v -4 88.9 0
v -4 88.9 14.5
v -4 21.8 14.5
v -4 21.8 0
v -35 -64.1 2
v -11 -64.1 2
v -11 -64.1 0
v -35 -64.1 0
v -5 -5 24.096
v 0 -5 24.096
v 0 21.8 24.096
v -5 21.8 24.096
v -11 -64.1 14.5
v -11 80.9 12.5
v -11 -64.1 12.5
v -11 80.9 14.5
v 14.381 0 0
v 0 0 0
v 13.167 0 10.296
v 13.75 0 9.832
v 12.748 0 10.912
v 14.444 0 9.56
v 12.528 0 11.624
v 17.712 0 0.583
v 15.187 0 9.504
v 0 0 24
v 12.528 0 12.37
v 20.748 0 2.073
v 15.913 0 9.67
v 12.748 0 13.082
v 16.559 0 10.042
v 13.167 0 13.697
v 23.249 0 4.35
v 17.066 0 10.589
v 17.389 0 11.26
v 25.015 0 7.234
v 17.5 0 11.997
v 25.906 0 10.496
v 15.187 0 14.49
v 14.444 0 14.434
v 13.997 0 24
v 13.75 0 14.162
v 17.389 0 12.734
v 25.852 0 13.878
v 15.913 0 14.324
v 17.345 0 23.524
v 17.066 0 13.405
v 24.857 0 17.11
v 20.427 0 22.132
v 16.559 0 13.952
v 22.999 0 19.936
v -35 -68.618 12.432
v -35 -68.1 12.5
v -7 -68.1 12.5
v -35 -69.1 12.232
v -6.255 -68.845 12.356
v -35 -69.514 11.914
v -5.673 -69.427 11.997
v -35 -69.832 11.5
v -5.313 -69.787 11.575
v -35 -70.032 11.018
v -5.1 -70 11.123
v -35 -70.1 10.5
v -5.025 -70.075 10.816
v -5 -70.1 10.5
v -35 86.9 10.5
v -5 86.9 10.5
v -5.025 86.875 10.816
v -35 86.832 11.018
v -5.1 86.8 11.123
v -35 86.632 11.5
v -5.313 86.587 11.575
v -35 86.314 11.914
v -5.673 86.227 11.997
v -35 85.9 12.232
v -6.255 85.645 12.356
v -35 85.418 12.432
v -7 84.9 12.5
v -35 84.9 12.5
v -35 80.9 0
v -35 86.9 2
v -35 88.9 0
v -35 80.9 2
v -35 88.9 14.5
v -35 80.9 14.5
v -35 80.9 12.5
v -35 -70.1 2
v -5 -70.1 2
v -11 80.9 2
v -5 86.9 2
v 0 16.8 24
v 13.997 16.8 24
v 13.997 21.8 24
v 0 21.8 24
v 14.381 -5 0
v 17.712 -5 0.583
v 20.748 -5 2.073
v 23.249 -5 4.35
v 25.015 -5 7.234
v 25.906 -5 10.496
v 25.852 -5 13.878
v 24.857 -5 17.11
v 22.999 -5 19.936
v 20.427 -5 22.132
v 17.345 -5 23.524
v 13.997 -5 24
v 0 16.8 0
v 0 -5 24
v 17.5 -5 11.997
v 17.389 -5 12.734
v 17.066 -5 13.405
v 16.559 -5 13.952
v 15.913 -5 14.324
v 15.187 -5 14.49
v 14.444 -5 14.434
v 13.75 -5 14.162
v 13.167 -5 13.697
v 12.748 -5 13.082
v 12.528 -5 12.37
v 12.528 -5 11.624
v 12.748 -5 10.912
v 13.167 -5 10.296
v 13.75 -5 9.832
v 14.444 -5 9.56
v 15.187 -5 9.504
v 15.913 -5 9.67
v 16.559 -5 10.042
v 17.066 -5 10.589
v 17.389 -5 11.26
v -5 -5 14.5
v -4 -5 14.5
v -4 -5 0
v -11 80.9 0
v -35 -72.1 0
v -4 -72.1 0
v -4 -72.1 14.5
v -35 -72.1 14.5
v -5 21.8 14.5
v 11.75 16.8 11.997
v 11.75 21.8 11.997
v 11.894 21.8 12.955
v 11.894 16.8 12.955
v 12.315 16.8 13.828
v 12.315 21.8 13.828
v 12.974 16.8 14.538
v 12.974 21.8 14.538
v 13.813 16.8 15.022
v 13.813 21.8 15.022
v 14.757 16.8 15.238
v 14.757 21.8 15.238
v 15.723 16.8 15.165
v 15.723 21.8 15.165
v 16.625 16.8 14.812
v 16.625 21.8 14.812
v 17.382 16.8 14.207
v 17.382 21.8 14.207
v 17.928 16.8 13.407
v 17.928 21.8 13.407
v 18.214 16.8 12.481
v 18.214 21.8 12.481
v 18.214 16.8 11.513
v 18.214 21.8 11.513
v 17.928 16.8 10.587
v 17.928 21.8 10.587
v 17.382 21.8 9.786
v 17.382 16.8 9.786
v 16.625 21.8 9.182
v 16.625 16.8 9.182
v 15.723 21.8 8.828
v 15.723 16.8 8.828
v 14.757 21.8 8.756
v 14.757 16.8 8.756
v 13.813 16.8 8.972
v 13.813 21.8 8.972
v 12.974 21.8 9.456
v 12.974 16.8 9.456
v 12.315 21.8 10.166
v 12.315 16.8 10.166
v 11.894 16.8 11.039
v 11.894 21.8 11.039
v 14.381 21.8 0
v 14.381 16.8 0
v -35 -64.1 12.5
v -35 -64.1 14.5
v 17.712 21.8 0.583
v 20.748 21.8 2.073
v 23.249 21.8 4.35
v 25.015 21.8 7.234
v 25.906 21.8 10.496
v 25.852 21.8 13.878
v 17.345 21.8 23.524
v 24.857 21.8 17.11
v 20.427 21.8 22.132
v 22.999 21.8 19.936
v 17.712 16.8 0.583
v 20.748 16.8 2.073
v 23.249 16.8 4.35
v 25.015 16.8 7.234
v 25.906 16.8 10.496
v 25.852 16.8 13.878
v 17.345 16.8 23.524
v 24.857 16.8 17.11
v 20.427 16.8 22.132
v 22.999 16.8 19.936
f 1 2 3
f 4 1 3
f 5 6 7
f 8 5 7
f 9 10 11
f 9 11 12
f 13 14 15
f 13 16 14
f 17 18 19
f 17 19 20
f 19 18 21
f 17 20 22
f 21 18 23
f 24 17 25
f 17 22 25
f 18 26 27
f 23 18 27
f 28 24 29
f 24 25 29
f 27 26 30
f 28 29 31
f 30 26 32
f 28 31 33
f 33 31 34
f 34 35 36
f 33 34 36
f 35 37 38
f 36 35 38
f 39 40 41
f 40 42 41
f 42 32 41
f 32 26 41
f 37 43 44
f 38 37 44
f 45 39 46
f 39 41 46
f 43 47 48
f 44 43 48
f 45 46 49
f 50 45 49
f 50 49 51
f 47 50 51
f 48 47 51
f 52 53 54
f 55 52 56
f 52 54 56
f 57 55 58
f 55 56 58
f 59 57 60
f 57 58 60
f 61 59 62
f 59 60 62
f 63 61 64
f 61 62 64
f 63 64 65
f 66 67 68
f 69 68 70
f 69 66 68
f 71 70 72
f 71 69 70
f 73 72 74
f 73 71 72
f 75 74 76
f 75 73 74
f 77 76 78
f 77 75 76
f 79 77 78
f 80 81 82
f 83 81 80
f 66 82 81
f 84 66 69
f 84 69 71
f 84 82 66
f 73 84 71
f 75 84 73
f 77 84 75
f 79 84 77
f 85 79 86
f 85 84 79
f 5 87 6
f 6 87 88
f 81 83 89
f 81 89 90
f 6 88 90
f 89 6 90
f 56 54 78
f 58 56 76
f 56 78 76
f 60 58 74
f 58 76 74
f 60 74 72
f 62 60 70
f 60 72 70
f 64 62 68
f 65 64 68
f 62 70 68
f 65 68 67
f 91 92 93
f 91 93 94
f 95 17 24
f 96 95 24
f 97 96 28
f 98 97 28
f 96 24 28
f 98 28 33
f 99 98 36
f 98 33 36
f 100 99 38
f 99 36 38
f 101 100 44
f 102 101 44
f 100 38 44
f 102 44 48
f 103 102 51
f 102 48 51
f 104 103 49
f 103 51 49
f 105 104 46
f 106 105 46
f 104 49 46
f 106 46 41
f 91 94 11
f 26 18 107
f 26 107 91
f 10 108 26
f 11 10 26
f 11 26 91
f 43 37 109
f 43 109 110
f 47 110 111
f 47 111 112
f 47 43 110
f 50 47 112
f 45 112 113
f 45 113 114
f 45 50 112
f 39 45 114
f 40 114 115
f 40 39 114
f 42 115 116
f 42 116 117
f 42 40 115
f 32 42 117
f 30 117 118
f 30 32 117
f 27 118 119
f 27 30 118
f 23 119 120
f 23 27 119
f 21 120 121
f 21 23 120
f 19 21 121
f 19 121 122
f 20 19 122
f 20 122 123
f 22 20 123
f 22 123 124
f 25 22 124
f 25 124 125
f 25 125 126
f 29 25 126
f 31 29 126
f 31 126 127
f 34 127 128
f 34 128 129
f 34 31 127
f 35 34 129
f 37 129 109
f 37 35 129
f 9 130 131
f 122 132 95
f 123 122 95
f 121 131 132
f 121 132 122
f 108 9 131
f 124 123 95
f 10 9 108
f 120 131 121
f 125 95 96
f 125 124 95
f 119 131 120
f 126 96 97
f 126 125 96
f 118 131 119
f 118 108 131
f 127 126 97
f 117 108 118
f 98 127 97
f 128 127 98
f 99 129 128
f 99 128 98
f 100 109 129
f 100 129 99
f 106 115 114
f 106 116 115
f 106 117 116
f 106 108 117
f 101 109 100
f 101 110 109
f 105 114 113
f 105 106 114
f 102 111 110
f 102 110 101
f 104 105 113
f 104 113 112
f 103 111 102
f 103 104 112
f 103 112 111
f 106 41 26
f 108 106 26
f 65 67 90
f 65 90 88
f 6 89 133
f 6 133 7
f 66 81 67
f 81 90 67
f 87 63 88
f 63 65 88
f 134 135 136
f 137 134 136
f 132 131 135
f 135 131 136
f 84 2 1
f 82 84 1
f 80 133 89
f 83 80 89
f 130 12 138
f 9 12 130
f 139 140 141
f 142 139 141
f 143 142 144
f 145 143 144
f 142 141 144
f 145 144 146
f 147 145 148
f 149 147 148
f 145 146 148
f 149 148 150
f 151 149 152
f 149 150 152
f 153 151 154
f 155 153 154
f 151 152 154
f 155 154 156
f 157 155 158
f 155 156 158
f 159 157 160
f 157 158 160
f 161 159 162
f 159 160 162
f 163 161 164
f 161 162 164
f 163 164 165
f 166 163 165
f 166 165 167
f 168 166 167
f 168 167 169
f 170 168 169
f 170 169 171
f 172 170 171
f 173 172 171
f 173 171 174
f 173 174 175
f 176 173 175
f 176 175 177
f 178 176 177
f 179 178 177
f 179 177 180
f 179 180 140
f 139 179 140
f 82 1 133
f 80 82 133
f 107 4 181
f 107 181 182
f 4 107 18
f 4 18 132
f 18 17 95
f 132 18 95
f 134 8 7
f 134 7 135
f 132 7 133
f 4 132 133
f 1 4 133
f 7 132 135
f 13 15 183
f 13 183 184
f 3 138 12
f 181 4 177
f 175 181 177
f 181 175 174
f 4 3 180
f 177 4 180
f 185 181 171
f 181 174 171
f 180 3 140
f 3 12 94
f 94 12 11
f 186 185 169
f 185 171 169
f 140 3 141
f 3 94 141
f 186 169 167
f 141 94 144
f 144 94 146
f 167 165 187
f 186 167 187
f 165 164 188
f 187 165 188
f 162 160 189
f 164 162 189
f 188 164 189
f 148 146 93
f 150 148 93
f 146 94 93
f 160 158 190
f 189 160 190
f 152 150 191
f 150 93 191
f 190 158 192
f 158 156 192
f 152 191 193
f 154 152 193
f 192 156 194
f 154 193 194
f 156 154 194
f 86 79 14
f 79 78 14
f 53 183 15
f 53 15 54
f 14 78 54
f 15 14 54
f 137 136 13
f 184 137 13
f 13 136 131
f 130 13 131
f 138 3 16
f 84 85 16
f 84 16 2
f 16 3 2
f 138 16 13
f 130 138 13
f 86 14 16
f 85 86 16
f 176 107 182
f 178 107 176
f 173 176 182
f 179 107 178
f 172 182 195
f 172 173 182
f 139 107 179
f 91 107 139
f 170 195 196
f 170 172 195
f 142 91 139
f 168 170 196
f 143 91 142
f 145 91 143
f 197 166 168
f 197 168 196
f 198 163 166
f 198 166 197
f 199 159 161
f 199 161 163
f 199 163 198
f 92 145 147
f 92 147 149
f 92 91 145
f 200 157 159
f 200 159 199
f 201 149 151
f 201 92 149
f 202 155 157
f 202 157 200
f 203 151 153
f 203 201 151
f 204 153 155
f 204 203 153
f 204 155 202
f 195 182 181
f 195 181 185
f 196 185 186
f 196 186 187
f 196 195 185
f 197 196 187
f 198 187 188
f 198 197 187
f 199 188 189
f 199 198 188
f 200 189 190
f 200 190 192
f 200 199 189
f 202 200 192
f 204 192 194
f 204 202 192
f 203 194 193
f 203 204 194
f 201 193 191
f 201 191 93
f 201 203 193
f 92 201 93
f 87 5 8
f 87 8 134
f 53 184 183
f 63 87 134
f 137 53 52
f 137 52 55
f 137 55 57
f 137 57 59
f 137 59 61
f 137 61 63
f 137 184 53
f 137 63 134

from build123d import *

# Parameters (mm, degrees)
F0_R          = 3.3
F0_R_2        = 2.5
F1_DEPTH      = 5
F2_DEPTH      = 5
F2_DEPTH_BACK = 21.8
F5_R          = 3.25
F5_R_2        = 2.5
F6_DEPTH      = 6
F7_W          = 59.1
F7_H          = 2
F7_W_2        = 6
F8_DEPTH      = 1
F7_W_3        = 13.4
F9_DEPTH      = 6
F10_DEPTH     = 30
F11_R         = 2


with BuildPart() as f1:
    # F0 (on Front) → F1 (new body)
    with BuildSketch(Plane.XZ):
        with BuildLine():
            Line((13.9969279973, 24), (0, 24))
            Line((0, 24), (0, 0))
            Line((0, 0), (14.3809281676, 0))
            ThreePointArc((14.3809281676, 0), (25.9984639003, 12.1889526569), (13.9969279973, 24))
        make_face()
        with Locations((15, 11.9969279973)):
            Circle(F0_R, mode=Mode.SUBTRACT)
        with Locations((15, 11.9969279973)):
            Circle(F0_R)
        with Locations((15, 11.9969279973)):
            Circle(F0_R_2, mode=Mode.SUBTRACT)
    extrude(amount=F1_DEPTH)

    # F0 (on Front) → F2 (join, two sides)
    with BuildSketch(Plane.XZ) as f2_sk:
        Polygon((0, 0), (0, 24), (0, 24.0955166519), (-5, 24.0955166519), (-5, 0), align=None)
    extrude(amount=F2_DEPTH)
    extrude(f2_sk.sketch, amount=-F2_DEPTH_BACK)

    # F4: F1 across plane


with BuildPart() as f1_1:
    add(f1.part)
    add(f1.part.mirror(Plane.XZ.offset(-8.4)))

    # F5 (on face) → F6 (cut)
    with BuildSketch(Plane(origin=(0, 21.8, 0), x_dir=(-1, 0, 0), z_dir=(0, 1, 0))):
        with Locations((-15, 11.9969279973)):
            Circle(F5_R)
        with Locations((-15, 11.9969279973)):
            Circle(F5_R_2, mode=Mode.SUBTRACT)
    extrude(amount=-F6_DEPTH, mode=Mode.SUBTRACT)

    # F7 (on face) → F8 (join)
    with BuildSketch(Plane(origin=(-5, 0, 0), x_dir=(0, -1, 0), z_dir=(-1, 0, 0))):
        with Locations((-51.35, 1)):
            Rectangle(F7_W, F7_H)
        with Locations((34.55, 1)):
            Rectangle(F7_W, F7_H)
        Polygon((-86.9, 0), (-80.9, 0), (-80.9, 2), (-86.9, 2), (-86.9, 1), align=None)
        Polygon((-80.9, 2), (-21.8, 2), (-21.8, 7.25), (-86.9, 7.25), (-86.9, 2), align=None)
        Polygon((5, 12.5), (5, 2), (64.1, 2), (70.1, 2), (70.1, 7.25), (70.1, 12.5), (64.1, 12.5), align=None)
        Polygon((64.1, 2), (64.1, 0), (70.1, 0), (72.1, 0), (72.1, 7.25), (72.1, 14.5), (70.1, 14.5), (70.1, 12.5), (70.1, 7.25), (70.1, 2), align=None)
        Polygon((-88.9, 0), (-86.9, 0), (-86.9, 1), (-86.9, 2), (-86.9, 7.25), (-88.9, 7.25), align=None)
        Polygon((-86.9, 7.25), (-21.8, 7.25), (-21.8, 12.5), (-80.9, 12.5), (-86.9, 12.5), align=None)
        with Locations((34.55, 13.5)):
            Rectangle(F7_W, F7_H)
        Polygon((-88.9, 7.25), (-86.9, 7.25), (-86.9, 12.5), (-86.9, 14.5), (-88.9, 14.5), align=None)
        with Locations((-51.35, 13.5)):
            Rectangle(F7_W, F7_H)
        with Locations((67.1, 13.5)):
            Rectangle(F7_W_2, F7_H)
        with Locations((-83.9, 13.5)):
            Rectangle(F7_W_2, F7_H)
    extrude(amount=-F8_DEPTH)

    # F7 (on face) → F9 (join)
    with BuildSketch(Plane(origin=(-5, 0, 0), x_dir=(0, -1, 0), z_dir=(-1, 0, 0))):
        with Locations((34.55, 13.5)):
            Rectangle(F7_W, F7_H)
        with Locations((67.1, 13.5)):
            Rectangle(F7_W_2, F7_H)
        Polygon((64.1, 2), (64.1, 0), (70.1, 0), (72.1, 0), (72.1, 7.25), (72.1, 14.5), (70.1, 14.5), (70.1, 12.5), (70.1, 7.25), (70.1, 2), align=None)
        with Locations((34.55, 1)):
            Rectangle(F7_W, F7_H)
        with Locations((-15.1, 1)):
            Rectangle(F7_W_3, F7_H)
        with Locations((-1.7, 1)):
            Rectangle(F7_W_3, F7_H)
        Polygon((-8.4, 12.5), (5, 12.5), (5, 14.5), (-8.4, 14.5), (-21.8, 14.5), (-21.8, 12.5), align=None)
        with Locations((-51.35, 13.5)):
            Rectangle(F7_W, F7_H)
        with Locations((-51.35, 1)):
            Rectangle(F7_W, F7_H)
        with Locations((-83.9, 13.5)):
            Rectangle(F7_W_2, F7_H)
        Polygon((-88.9, 7.25), (-86.9, 7.25), (-86.9, 12.5), (-86.9, 14.5), (-88.9, 14.5), align=None)
        Polygon((-88.9, 0), (-86.9, 0), (-86.9, 1), (-86.9, 2), (-86.9, 7.25), (-88.9, 7.25), align=None)
        Polygon((-86.9, 0), (-80.9, 0), (-80.9, 2), (-86.9, 2), (-86.9, 1), align=None)
    extrude(amount=F9_DEPTH)

    # F7 (on face) → F10 (join)
    with BuildSketch(Plane(origin=(-5, 0, 0), x_dir=(0, -1, 0), z_dir=(-1, 0, 0))):
        with Locations((-83.9, 13.5)):
            Rectangle(F7_W_2, F7_H)
        Polygon((-88.9, 7.25), (-86.9, 7.25), (-86.9, 12.5), (-86.9, 14.5), (-88.9, 14.5), align=None)
        Polygon((-88.9, 0), (-86.9, 0), (-86.9, 1), (-86.9, 2), (-86.9, 7.25), (-88.9, 7.25), align=None)
        Polygon((-86.9, 0), (-80.9, 0), (-80.9, 2), (-86.9, 2), (-86.9, 1), align=None)
        Polygon((64.1, 2), (64.1, 0), (70.1, 0), (72.1, 0), (72.1, 7.25), (72.1, 14.5), (70.1, 14.5), (70.1, 12.5), (70.1, 7.25), (70.1, 2), align=None)
        with Locations((67.1, 13.5)):
            Rectangle(F7_W_2, F7_H)
    extrude(amount=F10_DEPTH)

    # F11
    f11_edges = [f1_1.edges().sort_by_distance(p)[0] for p in [
        (-20, -70.1, 12.5),
        (-5, 8.4, 12.5),
        (-20, 86.9, 12.5),
    ]]
    fillet(f11_edges, radius=F11_R)


solid = f1_1.part
